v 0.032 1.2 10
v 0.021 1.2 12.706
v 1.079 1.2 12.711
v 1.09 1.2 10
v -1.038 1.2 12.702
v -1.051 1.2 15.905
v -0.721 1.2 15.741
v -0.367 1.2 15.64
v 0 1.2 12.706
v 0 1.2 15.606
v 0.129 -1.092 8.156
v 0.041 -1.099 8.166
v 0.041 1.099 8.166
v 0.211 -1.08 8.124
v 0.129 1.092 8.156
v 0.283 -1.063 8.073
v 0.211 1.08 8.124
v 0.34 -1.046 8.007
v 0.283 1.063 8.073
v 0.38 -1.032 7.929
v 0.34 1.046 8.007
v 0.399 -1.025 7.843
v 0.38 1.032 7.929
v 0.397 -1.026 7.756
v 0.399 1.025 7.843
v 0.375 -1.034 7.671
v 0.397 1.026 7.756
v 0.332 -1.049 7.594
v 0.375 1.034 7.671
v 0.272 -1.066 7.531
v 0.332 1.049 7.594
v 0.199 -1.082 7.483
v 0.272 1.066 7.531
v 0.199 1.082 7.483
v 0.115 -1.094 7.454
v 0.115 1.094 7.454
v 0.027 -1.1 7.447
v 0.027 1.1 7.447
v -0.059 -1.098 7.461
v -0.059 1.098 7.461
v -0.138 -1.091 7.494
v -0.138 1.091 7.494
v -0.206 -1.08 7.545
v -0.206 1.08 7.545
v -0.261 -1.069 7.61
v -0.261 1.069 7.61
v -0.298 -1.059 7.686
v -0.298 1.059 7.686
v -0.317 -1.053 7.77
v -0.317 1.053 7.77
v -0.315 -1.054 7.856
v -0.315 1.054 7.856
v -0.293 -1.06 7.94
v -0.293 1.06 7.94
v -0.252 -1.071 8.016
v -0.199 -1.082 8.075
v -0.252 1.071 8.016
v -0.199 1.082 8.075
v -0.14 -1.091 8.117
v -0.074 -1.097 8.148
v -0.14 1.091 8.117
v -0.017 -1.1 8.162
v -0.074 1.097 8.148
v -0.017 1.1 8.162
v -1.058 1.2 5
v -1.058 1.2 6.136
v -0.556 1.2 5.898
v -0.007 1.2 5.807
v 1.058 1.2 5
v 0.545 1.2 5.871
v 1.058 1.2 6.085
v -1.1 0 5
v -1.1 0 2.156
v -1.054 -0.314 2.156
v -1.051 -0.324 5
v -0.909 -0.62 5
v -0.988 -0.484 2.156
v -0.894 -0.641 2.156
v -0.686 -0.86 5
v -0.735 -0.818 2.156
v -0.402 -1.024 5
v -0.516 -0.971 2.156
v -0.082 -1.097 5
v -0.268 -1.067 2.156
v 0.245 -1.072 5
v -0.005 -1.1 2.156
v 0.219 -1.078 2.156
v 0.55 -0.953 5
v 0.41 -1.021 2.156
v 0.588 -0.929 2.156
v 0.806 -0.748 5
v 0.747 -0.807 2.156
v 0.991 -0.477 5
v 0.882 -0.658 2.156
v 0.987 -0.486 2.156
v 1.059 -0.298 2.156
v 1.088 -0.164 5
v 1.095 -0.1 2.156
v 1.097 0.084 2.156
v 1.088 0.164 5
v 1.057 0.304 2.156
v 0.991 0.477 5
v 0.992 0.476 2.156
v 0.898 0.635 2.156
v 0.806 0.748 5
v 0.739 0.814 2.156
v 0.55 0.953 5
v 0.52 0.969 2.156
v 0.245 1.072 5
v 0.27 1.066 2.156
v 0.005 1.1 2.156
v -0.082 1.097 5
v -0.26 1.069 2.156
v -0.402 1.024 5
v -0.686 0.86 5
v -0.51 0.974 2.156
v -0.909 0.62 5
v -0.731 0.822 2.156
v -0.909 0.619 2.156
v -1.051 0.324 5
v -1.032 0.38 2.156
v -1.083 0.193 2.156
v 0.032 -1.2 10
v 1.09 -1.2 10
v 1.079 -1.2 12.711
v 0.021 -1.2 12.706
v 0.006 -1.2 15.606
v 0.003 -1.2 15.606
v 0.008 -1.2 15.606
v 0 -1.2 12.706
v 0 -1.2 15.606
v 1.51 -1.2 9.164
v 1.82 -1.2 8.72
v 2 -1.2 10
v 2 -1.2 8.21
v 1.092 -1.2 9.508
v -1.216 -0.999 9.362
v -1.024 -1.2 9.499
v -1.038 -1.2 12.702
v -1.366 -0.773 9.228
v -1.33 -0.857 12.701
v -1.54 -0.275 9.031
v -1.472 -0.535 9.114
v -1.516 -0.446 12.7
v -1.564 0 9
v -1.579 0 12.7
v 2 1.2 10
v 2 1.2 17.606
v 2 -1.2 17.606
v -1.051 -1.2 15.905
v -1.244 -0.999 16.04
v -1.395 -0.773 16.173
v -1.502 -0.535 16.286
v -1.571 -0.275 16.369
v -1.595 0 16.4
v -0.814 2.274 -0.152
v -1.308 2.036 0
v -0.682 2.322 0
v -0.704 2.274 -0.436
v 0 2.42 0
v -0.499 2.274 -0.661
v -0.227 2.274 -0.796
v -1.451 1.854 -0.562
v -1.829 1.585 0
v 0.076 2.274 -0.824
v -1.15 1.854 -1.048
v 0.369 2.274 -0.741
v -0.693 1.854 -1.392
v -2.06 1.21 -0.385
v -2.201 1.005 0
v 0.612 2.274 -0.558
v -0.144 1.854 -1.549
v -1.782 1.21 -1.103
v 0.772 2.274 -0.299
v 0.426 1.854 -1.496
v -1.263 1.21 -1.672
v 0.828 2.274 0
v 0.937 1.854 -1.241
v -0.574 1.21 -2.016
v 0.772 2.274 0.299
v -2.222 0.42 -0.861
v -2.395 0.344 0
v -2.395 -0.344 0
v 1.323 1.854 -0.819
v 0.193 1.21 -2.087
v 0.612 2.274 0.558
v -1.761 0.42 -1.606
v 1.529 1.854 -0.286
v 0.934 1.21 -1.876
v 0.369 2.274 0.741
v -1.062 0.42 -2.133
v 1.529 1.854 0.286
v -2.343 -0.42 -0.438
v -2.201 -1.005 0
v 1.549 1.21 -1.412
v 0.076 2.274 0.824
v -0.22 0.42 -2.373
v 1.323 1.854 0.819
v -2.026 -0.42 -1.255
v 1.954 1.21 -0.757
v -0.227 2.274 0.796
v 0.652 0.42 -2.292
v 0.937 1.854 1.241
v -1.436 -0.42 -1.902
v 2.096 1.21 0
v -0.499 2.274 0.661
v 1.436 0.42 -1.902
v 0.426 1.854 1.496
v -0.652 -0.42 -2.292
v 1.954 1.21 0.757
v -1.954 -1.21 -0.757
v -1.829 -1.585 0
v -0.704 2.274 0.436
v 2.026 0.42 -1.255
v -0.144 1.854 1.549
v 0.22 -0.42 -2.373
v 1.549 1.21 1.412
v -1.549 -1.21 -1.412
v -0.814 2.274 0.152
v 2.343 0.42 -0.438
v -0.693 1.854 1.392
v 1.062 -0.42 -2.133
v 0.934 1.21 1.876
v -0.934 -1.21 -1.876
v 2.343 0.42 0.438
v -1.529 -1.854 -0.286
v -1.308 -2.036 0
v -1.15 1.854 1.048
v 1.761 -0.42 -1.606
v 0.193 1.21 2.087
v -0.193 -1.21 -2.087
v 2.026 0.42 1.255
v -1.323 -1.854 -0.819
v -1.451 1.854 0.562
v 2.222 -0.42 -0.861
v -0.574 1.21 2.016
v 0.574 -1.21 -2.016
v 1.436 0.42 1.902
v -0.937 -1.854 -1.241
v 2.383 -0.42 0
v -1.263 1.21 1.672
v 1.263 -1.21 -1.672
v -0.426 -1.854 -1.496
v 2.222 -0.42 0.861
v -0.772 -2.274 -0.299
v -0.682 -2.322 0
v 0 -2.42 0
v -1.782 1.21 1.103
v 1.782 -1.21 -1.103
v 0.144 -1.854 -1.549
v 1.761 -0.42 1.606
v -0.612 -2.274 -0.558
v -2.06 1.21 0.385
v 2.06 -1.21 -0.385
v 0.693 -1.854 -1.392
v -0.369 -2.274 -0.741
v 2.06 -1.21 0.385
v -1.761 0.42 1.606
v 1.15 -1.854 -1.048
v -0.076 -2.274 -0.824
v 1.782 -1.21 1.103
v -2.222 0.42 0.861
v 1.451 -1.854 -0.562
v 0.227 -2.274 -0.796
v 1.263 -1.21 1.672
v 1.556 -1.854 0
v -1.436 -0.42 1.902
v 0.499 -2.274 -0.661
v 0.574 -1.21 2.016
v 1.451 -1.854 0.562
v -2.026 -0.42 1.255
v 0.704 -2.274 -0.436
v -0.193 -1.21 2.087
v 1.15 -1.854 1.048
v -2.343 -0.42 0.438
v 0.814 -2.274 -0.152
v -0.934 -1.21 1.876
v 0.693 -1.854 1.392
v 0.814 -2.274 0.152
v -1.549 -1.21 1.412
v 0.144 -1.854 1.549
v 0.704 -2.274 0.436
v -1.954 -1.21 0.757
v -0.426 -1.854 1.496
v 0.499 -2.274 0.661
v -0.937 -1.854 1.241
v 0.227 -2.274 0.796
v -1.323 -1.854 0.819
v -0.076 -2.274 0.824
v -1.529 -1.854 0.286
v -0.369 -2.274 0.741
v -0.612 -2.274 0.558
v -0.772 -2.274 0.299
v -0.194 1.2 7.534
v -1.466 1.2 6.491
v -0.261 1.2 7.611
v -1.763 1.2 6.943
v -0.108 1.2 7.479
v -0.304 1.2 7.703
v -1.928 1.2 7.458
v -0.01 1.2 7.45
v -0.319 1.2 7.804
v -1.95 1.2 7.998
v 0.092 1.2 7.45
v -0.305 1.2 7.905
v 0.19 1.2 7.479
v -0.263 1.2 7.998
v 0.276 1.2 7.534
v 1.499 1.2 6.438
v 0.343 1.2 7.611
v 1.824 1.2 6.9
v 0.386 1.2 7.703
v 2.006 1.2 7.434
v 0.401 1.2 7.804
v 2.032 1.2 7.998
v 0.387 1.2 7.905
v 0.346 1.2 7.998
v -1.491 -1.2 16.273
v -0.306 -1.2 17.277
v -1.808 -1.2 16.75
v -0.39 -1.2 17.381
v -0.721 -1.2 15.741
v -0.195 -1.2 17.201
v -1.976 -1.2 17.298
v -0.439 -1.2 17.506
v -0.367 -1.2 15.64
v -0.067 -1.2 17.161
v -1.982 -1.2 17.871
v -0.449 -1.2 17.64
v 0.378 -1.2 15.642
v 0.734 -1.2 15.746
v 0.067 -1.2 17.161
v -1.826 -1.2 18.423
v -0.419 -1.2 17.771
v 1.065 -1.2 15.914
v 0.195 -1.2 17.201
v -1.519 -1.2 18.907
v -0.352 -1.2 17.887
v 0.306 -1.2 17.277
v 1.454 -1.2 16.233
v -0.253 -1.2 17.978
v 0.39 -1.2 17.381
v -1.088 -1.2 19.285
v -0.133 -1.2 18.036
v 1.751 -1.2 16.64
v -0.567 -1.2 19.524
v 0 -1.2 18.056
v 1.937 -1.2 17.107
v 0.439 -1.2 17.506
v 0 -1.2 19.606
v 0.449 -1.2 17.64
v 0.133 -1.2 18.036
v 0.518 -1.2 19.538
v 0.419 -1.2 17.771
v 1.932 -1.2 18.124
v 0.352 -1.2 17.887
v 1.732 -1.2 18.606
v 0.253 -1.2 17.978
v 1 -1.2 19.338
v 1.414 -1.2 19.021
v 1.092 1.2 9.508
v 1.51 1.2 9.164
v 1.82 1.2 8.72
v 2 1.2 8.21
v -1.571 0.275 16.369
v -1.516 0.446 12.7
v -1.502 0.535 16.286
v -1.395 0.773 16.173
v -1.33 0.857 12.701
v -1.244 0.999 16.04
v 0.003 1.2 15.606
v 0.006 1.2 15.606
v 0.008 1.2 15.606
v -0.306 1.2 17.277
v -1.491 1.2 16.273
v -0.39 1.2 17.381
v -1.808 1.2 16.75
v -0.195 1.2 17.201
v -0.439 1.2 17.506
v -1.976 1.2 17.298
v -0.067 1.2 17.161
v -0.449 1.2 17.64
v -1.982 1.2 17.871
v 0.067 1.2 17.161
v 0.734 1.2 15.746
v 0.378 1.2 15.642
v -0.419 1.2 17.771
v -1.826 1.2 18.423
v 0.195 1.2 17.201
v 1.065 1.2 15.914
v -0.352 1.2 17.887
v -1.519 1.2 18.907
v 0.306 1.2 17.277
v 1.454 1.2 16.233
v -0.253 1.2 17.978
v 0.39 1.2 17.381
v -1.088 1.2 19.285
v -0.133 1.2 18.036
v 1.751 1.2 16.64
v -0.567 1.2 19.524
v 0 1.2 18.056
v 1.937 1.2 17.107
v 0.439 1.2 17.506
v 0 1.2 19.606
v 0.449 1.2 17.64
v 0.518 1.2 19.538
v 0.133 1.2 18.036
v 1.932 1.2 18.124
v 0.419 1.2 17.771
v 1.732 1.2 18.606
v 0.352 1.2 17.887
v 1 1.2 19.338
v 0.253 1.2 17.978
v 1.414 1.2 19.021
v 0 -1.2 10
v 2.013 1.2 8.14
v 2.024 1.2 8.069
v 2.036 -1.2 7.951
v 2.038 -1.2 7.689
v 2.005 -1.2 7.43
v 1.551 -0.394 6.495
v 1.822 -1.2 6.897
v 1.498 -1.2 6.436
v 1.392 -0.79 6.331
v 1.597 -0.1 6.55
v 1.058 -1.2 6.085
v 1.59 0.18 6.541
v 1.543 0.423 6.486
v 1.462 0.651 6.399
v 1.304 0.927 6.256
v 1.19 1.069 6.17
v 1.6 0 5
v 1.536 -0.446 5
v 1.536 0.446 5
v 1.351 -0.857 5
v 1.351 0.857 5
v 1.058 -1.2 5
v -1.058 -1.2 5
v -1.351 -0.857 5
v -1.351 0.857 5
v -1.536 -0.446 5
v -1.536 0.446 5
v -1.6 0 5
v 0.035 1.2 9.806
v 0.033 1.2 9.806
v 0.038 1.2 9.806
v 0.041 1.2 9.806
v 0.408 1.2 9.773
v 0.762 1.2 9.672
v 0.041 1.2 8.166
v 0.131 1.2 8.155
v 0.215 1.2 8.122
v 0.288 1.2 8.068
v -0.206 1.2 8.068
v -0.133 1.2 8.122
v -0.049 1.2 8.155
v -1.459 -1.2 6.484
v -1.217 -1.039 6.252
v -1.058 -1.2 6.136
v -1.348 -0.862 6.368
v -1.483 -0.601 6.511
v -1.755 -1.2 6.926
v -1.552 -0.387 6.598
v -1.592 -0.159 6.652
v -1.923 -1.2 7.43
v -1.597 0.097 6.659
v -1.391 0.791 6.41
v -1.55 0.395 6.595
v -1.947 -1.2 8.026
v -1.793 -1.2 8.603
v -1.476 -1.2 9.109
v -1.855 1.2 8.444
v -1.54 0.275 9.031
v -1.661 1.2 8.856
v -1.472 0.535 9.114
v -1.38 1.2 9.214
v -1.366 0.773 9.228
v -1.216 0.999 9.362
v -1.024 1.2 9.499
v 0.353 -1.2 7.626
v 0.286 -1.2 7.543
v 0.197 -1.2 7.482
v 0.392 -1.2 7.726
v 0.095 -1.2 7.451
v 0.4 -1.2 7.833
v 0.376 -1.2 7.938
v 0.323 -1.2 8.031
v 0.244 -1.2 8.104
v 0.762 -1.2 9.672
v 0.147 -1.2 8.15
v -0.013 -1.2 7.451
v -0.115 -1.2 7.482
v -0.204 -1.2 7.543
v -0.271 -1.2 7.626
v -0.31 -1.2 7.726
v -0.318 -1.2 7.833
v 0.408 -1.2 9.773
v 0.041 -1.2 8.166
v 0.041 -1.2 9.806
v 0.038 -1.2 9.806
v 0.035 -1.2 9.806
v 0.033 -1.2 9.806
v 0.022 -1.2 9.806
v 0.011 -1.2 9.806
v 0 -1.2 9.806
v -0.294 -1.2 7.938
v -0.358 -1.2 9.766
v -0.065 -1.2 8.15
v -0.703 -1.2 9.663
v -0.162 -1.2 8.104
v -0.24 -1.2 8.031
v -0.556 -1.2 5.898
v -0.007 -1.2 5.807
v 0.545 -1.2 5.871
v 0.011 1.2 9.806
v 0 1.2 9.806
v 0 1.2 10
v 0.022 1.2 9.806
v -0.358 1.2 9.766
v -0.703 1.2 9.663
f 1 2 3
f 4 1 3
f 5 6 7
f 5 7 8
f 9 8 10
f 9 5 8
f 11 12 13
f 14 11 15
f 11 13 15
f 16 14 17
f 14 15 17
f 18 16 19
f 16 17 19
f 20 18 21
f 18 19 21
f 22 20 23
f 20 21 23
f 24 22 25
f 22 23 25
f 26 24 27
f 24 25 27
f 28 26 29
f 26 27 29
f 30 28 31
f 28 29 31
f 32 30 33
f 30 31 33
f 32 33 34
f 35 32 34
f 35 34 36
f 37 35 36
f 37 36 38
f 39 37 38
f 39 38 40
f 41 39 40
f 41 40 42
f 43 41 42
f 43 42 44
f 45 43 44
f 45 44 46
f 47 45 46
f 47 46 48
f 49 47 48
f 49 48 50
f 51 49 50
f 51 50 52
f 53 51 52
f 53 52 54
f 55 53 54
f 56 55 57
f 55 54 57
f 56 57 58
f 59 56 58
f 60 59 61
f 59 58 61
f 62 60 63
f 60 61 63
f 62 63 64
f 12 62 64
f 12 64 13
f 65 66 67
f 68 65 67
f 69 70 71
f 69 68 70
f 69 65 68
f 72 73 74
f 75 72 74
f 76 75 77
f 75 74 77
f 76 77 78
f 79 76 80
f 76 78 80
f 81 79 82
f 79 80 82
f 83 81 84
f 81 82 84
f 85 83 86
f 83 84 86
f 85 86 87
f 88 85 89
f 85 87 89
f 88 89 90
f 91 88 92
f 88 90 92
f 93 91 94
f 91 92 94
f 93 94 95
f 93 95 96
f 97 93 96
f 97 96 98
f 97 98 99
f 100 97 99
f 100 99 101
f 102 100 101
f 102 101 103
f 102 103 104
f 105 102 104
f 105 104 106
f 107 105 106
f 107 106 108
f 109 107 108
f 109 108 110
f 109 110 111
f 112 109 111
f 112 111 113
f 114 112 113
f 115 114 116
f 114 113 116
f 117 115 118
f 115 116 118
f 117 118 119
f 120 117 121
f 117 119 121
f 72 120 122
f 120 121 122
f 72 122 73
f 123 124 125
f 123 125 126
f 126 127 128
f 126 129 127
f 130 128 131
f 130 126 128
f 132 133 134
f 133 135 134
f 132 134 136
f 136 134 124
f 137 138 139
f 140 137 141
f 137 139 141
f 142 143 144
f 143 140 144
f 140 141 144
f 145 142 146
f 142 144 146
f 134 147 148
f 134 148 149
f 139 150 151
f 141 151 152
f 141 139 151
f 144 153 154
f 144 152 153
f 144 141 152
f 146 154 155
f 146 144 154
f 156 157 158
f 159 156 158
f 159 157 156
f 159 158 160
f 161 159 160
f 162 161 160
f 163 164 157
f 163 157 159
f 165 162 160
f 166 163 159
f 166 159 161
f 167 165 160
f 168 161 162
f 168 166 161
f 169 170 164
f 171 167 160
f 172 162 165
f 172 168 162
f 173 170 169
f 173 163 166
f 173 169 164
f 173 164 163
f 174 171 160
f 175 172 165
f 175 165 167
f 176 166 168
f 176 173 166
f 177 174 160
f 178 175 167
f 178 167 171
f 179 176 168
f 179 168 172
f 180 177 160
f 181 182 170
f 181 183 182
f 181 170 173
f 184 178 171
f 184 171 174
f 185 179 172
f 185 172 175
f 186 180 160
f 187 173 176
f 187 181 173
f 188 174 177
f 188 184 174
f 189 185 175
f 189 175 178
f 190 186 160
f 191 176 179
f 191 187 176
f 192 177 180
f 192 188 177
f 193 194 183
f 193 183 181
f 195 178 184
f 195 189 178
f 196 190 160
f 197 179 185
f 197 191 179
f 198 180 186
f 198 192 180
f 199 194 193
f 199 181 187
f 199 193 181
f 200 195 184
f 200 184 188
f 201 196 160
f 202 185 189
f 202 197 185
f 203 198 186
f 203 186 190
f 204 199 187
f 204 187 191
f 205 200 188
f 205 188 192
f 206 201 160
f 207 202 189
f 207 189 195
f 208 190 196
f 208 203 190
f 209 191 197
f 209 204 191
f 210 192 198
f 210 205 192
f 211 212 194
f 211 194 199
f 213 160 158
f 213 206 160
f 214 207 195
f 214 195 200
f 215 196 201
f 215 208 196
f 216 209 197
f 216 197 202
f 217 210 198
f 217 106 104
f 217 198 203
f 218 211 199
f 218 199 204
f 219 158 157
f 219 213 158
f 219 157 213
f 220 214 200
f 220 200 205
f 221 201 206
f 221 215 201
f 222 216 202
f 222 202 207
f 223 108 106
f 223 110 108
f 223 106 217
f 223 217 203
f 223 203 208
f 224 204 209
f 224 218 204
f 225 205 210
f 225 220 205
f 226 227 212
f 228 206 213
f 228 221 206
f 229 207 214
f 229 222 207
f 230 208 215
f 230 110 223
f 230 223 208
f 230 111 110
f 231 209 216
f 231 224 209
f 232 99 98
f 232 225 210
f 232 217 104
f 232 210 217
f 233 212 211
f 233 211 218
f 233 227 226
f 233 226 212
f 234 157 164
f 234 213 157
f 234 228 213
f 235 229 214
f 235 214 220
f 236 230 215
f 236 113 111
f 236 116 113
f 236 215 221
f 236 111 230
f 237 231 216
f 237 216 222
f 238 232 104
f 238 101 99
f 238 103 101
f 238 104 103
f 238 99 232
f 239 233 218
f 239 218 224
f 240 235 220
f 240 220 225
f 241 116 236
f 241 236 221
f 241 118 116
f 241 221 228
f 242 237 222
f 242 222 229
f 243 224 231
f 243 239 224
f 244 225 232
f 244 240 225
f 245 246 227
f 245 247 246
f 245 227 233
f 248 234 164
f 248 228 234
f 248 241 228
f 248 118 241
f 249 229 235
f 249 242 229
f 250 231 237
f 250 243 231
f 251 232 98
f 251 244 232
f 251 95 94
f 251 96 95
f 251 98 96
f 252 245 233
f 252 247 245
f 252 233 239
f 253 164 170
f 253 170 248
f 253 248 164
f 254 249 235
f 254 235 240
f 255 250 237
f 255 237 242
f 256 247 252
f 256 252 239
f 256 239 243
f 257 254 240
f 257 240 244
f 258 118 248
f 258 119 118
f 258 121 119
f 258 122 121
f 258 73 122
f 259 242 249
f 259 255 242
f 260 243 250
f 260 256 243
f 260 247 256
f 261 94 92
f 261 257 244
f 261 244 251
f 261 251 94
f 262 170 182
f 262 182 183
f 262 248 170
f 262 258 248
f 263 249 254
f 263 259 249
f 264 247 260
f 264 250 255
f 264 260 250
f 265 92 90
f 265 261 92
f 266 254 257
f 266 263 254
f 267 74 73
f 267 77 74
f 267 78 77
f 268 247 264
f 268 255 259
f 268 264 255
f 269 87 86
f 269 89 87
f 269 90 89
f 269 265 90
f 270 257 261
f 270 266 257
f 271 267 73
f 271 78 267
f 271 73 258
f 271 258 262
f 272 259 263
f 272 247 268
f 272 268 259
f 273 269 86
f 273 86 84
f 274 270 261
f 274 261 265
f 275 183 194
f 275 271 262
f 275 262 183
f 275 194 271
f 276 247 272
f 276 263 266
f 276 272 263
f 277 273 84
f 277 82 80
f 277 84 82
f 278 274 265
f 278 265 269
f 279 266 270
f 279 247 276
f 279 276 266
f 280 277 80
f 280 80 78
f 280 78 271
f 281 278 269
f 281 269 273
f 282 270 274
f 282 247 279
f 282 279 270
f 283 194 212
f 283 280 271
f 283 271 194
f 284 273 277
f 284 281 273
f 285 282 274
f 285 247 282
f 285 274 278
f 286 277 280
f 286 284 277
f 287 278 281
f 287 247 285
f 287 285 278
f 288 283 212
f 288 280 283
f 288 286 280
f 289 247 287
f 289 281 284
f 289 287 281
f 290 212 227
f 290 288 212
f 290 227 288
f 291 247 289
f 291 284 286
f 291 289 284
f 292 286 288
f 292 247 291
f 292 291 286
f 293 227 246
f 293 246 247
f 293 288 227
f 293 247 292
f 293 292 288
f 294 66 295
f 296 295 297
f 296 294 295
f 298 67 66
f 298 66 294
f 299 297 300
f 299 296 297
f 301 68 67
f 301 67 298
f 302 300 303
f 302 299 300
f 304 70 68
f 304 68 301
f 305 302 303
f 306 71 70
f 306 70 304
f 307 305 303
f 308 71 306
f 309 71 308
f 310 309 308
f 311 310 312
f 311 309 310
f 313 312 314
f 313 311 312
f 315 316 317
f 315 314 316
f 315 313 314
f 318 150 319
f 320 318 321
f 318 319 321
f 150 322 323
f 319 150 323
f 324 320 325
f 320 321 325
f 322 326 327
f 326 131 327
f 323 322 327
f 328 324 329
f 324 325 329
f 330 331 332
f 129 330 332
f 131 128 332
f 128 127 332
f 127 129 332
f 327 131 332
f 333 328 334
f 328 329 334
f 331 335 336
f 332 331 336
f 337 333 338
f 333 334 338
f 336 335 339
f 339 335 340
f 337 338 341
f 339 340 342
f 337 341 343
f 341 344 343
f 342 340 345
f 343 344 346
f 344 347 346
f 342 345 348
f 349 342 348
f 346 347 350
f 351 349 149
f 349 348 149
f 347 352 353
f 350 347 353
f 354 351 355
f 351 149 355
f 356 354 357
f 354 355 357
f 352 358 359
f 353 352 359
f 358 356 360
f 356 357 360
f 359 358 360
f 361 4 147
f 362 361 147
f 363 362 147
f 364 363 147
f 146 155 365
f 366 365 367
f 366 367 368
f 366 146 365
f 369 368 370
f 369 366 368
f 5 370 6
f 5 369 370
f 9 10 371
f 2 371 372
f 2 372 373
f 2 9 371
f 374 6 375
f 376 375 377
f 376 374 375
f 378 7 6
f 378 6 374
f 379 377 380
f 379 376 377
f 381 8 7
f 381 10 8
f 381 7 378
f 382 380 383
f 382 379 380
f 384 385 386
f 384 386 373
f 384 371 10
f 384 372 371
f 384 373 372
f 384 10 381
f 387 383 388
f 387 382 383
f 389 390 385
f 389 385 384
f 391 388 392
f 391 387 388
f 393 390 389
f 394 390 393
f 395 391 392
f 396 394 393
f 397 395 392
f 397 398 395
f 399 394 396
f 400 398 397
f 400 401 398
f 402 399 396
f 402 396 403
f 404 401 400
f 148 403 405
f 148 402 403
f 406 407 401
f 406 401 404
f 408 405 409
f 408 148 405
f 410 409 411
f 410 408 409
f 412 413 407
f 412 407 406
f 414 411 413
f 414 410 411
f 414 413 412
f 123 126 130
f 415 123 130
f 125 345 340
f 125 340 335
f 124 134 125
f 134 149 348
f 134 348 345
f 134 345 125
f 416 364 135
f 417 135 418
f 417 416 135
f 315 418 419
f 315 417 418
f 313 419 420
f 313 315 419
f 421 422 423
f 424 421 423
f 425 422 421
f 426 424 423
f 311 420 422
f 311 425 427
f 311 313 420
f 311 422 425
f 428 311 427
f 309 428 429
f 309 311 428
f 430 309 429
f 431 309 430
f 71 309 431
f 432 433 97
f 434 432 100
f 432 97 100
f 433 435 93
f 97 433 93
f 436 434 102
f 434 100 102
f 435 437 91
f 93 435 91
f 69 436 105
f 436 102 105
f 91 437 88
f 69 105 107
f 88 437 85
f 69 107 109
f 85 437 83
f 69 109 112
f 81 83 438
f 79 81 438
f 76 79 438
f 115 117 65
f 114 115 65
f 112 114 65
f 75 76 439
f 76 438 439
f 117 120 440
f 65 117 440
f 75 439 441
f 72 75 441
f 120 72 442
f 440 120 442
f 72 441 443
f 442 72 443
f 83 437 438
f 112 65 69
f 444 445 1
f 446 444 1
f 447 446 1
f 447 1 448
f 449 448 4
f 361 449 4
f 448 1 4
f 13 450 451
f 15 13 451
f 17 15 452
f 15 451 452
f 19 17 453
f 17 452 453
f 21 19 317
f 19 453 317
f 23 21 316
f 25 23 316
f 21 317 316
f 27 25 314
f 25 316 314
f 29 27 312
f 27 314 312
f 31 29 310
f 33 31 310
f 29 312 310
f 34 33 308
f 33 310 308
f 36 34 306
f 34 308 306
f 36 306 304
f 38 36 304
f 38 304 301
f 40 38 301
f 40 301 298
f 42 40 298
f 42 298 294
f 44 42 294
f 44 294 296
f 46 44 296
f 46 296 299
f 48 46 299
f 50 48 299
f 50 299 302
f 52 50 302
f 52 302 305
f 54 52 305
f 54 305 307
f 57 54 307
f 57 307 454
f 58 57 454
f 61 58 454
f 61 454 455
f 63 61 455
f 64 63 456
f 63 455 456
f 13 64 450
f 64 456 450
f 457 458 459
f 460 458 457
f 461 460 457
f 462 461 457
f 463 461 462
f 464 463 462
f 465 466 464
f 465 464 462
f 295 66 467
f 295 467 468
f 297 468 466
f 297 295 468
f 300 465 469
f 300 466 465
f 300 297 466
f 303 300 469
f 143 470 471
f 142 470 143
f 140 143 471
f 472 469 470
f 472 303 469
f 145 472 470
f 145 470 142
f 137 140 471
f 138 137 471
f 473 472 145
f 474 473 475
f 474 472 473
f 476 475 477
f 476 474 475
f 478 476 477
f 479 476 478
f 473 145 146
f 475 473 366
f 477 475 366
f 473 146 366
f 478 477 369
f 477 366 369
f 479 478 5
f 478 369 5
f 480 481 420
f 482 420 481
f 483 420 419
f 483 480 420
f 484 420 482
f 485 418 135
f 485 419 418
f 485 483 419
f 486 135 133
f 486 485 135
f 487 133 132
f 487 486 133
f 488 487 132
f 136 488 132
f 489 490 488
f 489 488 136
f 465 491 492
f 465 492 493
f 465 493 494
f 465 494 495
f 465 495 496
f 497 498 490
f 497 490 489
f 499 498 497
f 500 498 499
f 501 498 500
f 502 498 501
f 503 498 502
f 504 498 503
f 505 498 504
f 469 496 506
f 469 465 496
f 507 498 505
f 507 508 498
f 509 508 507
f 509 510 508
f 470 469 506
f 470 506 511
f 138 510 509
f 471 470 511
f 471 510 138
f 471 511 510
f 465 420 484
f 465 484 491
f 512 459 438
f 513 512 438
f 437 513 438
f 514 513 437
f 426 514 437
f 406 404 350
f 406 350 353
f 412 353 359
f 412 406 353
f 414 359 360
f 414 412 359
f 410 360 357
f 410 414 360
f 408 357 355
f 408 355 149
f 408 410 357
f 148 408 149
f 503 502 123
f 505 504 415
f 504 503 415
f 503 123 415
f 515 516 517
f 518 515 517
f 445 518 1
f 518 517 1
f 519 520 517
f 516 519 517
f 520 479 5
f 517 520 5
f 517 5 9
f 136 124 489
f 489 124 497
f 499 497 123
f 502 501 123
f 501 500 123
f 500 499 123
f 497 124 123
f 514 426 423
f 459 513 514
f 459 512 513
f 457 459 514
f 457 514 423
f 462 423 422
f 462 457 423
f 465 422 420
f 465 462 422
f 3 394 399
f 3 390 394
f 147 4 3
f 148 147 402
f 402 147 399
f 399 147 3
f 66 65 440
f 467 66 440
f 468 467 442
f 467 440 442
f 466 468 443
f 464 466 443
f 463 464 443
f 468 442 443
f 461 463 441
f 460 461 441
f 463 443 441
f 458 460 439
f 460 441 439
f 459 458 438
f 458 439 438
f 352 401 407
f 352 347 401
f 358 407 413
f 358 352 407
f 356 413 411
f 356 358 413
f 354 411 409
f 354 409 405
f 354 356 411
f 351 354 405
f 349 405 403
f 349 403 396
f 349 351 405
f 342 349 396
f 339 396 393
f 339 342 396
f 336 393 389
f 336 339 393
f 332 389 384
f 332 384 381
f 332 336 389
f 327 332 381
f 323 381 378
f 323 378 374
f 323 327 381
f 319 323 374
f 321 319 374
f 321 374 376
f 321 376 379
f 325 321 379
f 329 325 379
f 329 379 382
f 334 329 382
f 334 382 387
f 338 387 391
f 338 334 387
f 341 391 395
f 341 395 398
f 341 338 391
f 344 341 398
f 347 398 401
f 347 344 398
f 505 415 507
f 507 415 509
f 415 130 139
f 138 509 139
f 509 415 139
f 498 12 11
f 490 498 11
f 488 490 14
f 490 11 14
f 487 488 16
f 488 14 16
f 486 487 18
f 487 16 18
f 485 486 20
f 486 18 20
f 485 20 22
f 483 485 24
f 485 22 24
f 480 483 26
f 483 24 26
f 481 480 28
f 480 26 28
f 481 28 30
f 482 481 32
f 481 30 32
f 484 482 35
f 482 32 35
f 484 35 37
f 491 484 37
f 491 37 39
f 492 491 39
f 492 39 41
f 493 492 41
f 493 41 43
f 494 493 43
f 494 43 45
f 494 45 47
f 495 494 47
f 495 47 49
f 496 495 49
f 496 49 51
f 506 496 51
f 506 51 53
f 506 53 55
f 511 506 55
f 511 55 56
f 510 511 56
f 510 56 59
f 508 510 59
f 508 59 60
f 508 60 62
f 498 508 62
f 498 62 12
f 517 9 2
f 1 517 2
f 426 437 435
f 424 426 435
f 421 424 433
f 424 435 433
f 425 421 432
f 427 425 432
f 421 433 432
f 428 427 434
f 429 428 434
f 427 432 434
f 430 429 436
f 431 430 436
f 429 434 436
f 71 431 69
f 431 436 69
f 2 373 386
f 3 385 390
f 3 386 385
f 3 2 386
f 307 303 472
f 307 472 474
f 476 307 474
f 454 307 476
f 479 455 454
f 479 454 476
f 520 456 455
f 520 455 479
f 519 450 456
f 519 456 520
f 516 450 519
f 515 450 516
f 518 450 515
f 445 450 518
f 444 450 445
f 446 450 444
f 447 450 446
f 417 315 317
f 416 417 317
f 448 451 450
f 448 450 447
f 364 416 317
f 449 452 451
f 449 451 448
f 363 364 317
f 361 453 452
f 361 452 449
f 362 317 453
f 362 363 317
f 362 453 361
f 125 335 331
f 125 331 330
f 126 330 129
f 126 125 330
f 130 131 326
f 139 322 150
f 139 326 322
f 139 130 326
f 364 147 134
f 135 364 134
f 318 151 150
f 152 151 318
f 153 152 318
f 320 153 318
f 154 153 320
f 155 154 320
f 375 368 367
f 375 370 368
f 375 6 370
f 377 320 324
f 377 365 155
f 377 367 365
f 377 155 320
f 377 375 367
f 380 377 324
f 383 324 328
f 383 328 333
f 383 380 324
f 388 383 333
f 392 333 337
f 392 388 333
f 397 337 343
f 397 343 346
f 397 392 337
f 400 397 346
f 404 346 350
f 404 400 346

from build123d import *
from build123d.topology import SkipClean

# Parameters (mm, degrees)
SKETCH_2_R                        = 1.1
EXTRUDE_1_DEPTH                   = 17.6064
CUT_EXTRUDE_1_DEPTH               = 18.93594504
CUT_EXTRUDE_1_DEPTH_BACK          = 18.93594504
SKETCH_3_R                        = 2
SKETCH_3_3_R                      = 2
SKETCH_3_3_R_2                    = 0.45
EXTRUDE_2_DEPTH                   = 1.2
EXTRUDE_8_REACH                   = 22.084
SKETCH_7_R                        = 2
SKETCH_7_R_2                      = 0.36
EXTRUDE_9_REACH                   = 17.744
EXTRUDE_9_END_RADIUS              = 2
EXTRUDE_9_DIRECTION_2_REACH       = 17.744
EXTRUDE_9_DIRECTION_2_END_RADIUS  = 2
SKETCH_11_R                       = 0.36
CUT_EXTRUDE_2_DEPTH               = 21.084116234
EXTRUDE_10_REACH                  = 14.883
EXTRUDE_10_END_RADIUS             = 2
EXTRUDE_10_DIRECTION_2_REACH      = 14.883
EXTRUDE_10_DIRECTION_2_END_RADIUS = 2
EXTRUDE_11_REACH                  = 17.002
EXTRUDE_11_END_RADIUS             = 2
SKETCH_13_R                       = 1.6
SKETCH_14_W                       = 7.40434877
SKETCH_14_H                       = 4.06336213
CUT_EXTRUDE_3_DEPTH               = 21.084116234
SKETCH_15_W                       = 5.898333764
SKETCH_15_H                       = 3.047472445
CUT_EXTRUDE_4_DEPTH               = 21.084116234


with BuildPart() as part:
    # 草图1 → 旋转1 (revolve)
    with SkipClean():  # the faces are left unmerged after this step: merging them gives an invalid solid
        with BuildSketch(Plane.XY):
            with BuildLine():
                ThreePointArc((2.42, 0), (1.71119841, 1.71119841), (0, 2.42))
                Line((0, 2.42), (0, -2.42))
                ThreePointArc((0, -2.42), (1.71119841, -1.71119841), (2.42, 0))
            make_face()
            with BuildLine():
                Line((0, -2.42), (0, 2.42))
                ThreePointArc((0, 2.42), (-2.42, 0), (0, -2.42))
            make_face()
        revolve(axis=Axis((0, 2.42, 0), (0, -1, 0)))

    # 草图2 → 凸台-拉伸1 (add)
    with SkipClean():  # the faces are left unmerged after this step: merging them gives an invalid solid
        with BuildSketch(Plane.XY):
            with Locations(Location((0, 0, 0), (0, 0, 180))):
                Circle(SKETCH_2_R)
        extrude(amount=EXTRUDE_1_DEPTH)

    # 草图3 → 切除-拉伸1 (cut, two sides: drawn at the far end of the back side and taken through both)
    with SkipClean():  # the faces are left unmerged after this step: merging them gives an invalid solid
        with BuildSketch(Plane(origin=(0, 0, 0), x_dir=(1, 0, 0), z_dir=(0, 1, 0)).offset(-CUT_EXTRUDE_1_DEPTH_BACK)):
            with Locations((0, -17.6064)):
                Circle(SKETCH_3_R)
        extrude(amount=CUT_EXTRUDE_1_DEPTH + CUT_EXTRUDE_1_DEPTH_BACK, mode=Mode.SUBTRACT)

    # 草图3<3> → 凸台-拉伸2 (add, symmetric)
    with SkipClean():  # the faces are left unmerged after this step: merging them gives an invalid solid
        with BuildSketch(Plane(origin=(0, 0, 0), x_dir=(1, 0, 0), z_dir=(0, 1, 0))):
            with Locations(Location((0, -17.6064, 0), (0, 0, 270))):
                Circle(SKETCH_3_3_R)
            with Locations(Location((0, -17.6064, 0), (0, 0, 270))):
                Circle(SKETCH_3_3_R_2, mode=Mode.SUBTRACT)
        extrude(amount=EXTRUDE_2_DEPTH, both=True)

    # 凸台-拉伸8: up to this face of the body (flat: up to its plane)
    extrude_8_end = Plane(part.part.faces().sort_by_distance((0, -1.2, 15.662968542))[0])
    # 草图7 → 凸台-拉伸8 (add, up to the picked face)
    with BuildSketch(Plane(origin=(0, 1.2, 0), x_dir=(1, 0, 0), z_dir=(0, 1, 0)), mode=Mode.PRIVATE) as extrude_8_sk1:
        with Locations(Location((0.041050024, -7.806485975, 0), (0, 0, 270))):
            Circle(SKETCH_7_R)
        with Locations(Location((0.041050024, -7.806485975, 0), (0, 0, 270))):
            Circle(SKETCH_7_R_2, mode=Mode.SUBTRACT)
    extrude_8_tool1 = split(extrude(extrude_8_sk1.sketch, amount=-EXTRUDE_8_REACH, mode=Mode.PRIVATE), bisect_by=extrude_8_end, keep=Keep.BOTH, mode=Mode.PRIVATE)
    add(extrude_8_tool1.solids().sort_by(Axis((0.04105, 1.2, 5.863055), (0, -1, 0)))[0])

    # 凸台-拉伸9: up to this cylinder (the profile starts outside it)
    with SkipClean():  # the faces are left unmerged after this step: merging them gives an invalid solid
        extrude_9_end = Plane(origin=(0.041050024, 0, 7.806485975), z_dir=(0, 1, 0)) * Cylinder(EXTRUDE_9_END_RADIUS, 40.488, mode=Mode.PRIVATE)
        # 草图10 → 凸台-拉伸9 (add, up to the surface)
        with BuildSketch(Plane(origin=(0.020525012, 1.2, 12.706442988), x_dir=(-0.9999912270311377, 0, -0.0041887779554037885), z_dir=(0.0041887779554037885, 0, -0.9999912270311377)), mode=Mode.PRIVATE) as extrude_9_sk1:
            with BuildLine():
                Line((1.058300524, 0), (0, 0))
                Line((0, 0), (0, -2.4))
                Line((0, -2.4), (1.058300524, -2.4))
                ThreePointArc((1.058300524, -2.4), (1.458300524, -1.858300524), (1.6, -1.2))
                ThreePointArc((1.6, -1.2), (1.458300524, -0.541699476), (1.058300524, 0))
            make_face()
        extrude_9_tool1 = extrude(extrude_9_sk1.sketch, amount=EXTRUDE_9_REACH, mode=Mode.PRIVATE) - extrude_9_end
        add(extrude_9_tool1.solids().sort_by_distance((-0.704839, 0, 12.703405))[0])
        # 草图10 → 凸台-拉伸9 (add, up to the surface)
        with BuildSketch(Plane(origin=(0.020525012, 1.2, 12.706442988), x_dir=(-0.9999912270311377, 0, -0.0041887779554037885), z_dir=(0.0041887779554037885, 0, -0.9999912270311377)), mode=Mode.PRIVATE) as extrude_9_sk2:
            with BuildLine():
                Line((0, -2.4), (0, 0))
                Line((0, 0), (-1.058300524, 0))
                ThreePointArc((-1.058300524, 0), (-1.6, -1.2), (-1.058300524, -2.4))
                Line((-1.058300524, -2.4), (0, -2.4))
            make_face()
        extrude_9_tool2 = extrude(extrude_9_sk2.sketch, amount=EXTRUDE_9_REACH, mode=Mode.PRIVATE) - extrude_9_end
        add(extrude_9_tool2.solids().sort_by_distance((0.745889, 0, 12.709481))[0])
        # 草图10 → 凸台-拉伸9 (add, up to the surface)
        with BuildSketch(Plane(origin=(0.020525012, 1.2, 12.706442988), x_dir=(-0.9999912270311377, 0, -0.0041887779554037885), z_dir=(0.0041887779554037885, 0, -0.9999912270311377)), mode=Mode.PRIVATE) as extrude_9_sk3:
            with BuildLine():
                Line((1.058300524, 0), (0, 0))
                Line((0, 0), (0, -2.4))
                Line((0, -2.4), (1.058300524, -2.4))
                ThreePointArc((1.058300524, -2.4), (1.458300524, -1.858300524), (1.6, -1.2))
                ThreePointArc((1.6, -1.2), (1.458300524, -0.541699476), (1.058300524, 0))
            make_face()
        extrude_9_tool3 = extrude(extrude_9_sk3.sketch, amount=EXTRUDE_9_REACH, mode=Mode.PRIVATE) - extrude_9_end
        add(extrude_9_tool3.solids().sort_by_distance((-0.704839, 0, 12.703405))[0])
        # 草图10 → 凸台-拉伸9 (add, up to the surface)
        with BuildSketch(Plane(origin=(0.020525012, 1.2, 12.706442988), x_dir=(-0.9999912270311377, 0, -0.0041887779554037885), z_dir=(0.0041887779554037885, 0, -0.9999912270311377)), mode=Mode.PRIVATE) as extrude_9_sk4:
            with BuildLine():
                Line((0, -2.4), (0, 0))
                Line((0, 0), (-1.058300524, 0))
                ThreePointArc((-1.058300524, 0), (-1.6, -1.2), (-1.058300524, -2.4))
                Line((-1.058300524, -2.4), (0, -2.4))
            make_face()
        extrude_9_tool4 = extrude(extrude_9_sk4.sketch, amount=EXTRUDE_9_REACH, mode=Mode.PRIVATE) - extrude_9_end
        add(extrude_9_tool4.solids().sort_by_distance((0.745889, 0, 12.709481))[0])

    # 凸台-拉伸9 direction 2: up to this cylinder (the profile starts outside it)
    with SkipClean():  # the faces are left unmerged after this step: merging them gives an invalid solid
        extrude_9_direction_2_end = Plane(origin=(0, 0, 17.6064), z_dir=(0, -1, 0)) * Cylinder(EXTRUDE_9_DIRECTION_2_END_RADIUS, 40.488, mode=Mode.PRIVATE)
        # 草图10 → 凸台-拉伸9 direction 2 (add, up to the surface)
        with BuildSketch(Plane(origin=(0.020525012, 1.2, 12.706442988), x_dir=(-0.9999912270311377, 0, -0.0041887779554037885), z_dir=(0.0041887779554037885, 0, -0.9999912270311377)), mode=Mode.PRIVATE) as extrude_9_direction_2_sk1:
            with BuildLine():
                Line((1.058300524, 0), (0, 0))
                Line((0, 0), (0, -2.4))
                Line((0, -2.4), (1.058300524, -2.4))
                ThreePointArc((1.058300524, -2.4), (1.458300524, -1.858300524), (1.6, -1.2))
                ThreePointArc((1.6, -1.2), (1.458300524, -0.541699476), (1.058300524, 0))
            make_face()
        extrude_9_direction_2_tool1 = extrude(extrude_9_direction_2_sk1.sketch, amount=-EXTRUDE_9_DIRECTION_2_REACH, mode=Mode.PRIVATE) - extrude_9_direction_2_end
        add(extrude_9_direction_2_tool1.solids().sort_by_distance((-0.704839, 0, 12.703405))[0])
        # 草图10 → 凸台-拉伸9 direction 2 (add, up to the surface)
        with BuildSketch(Plane(origin=(0.020525012, 1.2, 12.706442988), x_dir=(-0.9999912270311377, 0, -0.0041887779554037885), z_dir=(0.0041887779554037885, 0, -0.9999912270311377)), mode=Mode.PRIVATE) as extrude_9_direction_2_sk2:
            with BuildLine():
                Line((0, -2.4), (0, 0))
                Line((0, 0), (-1.058300524, 0))
                ThreePointArc((-1.058300524, 0), (-1.6, -1.2), (-1.058300524, -2.4))
                Line((-1.058300524, -2.4), (0, -2.4))
            make_face()
        extrude_9_direction_2_tool2 = extrude(extrude_9_direction_2_sk2.sketch, amount=-EXTRUDE_9_DIRECTION_2_REACH, mode=Mode.PRIVATE) - extrude_9_direction_2_end
        add(extrude_9_direction_2_tool2.solids().sort_by_distance((0.745889, 0, 12.709481))[0])
        # 草图10 → 凸台-拉伸9 direction 2 (add, up to the surface)
        with BuildSketch(Plane(origin=(0.020525012, 1.2, 12.706442988), x_dir=(-0.9999912270311377, 0, -0.0041887779554037885), z_dir=(0.0041887779554037885, 0, -0.9999912270311377)), mode=Mode.PRIVATE) as extrude_9_direction_2_sk3:
            with BuildLine():
                Line((1.058300524, 0), (0, 0))
                Line((0, 0), (0, -2.4))
                Line((0, -2.4), (1.058300524, -2.4))
                ThreePointArc((1.058300524, -2.4), (1.458300524, -1.858300524), (1.6, -1.2))
                ThreePointArc((1.6, -1.2), (1.458300524, -0.541699476), (1.058300524, 0))
            make_face()
        extrude_9_direction_2_tool3 = extrude(extrude_9_direction_2_sk3.sketch, amount=-EXTRUDE_9_DIRECTION_2_REACH, mode=Mode.PRIVATE) - extrude_9_direction_2_end
        add(extrude_9_direction_2_tool3.solids().sort_by_distance((-0.704839, 0, 12.703405))[0])
        # 草图10 → 凸台-拉伸9 direction 2 (add, up to the surface)
        with BuildSketch(Plane(origin=(0.020525012, 1.2, 12.706442988), x_dir=(-0.9999912270311377, 0, -0.0041887779554037885), z_dir=(0.0041887779554037885, 0, -0.9999912270311377)), mode=Mode.PRIVATE) as extrude_9_direction_2_sk4:
            with BuildLine():
                Line((0, -2.4), (0, 0))
                Line((0, 0), (-1.058300524, 0))
                ThreePointArc((-1.058300524, 0), (-1.6, -1.2), (-1.058300524, -2.4))
                Line((-1.058300524, -2.4), (0, -2.4))
            make_face()
        extrude_9_direction_2_tool4 = extrude(extrude_9_direction_2_sk4.sketch, amount=-EXTRUDE_9_DIRECTION_2_REACH, mode=Mode.PRIVATE) - extrude_9_direction_2_end
        add(extrude_9_direction_2_tool4.solids().sort_by_distance((0.745889, 0, 12.709481))[0])

    # 草图11 → 切除-拉伸2 (cut, through all)
    with SkipClean():  # the faces are left unmerged after this step: merging them gives an invalid solid
        with BuildSketch(Plane(origin=(0, 1.2, 0), x_dir=(1, 0, 0), z_dir=(0, 1, 0))):
            with Locations(Location((0.041050024, -7.806485975, 0), (0, 0, 270))):
                Circle(SKETCH_11_R)
        extrude(amount=-CUT_EXTRUDE_2_DEPTH, mode=Mode.SUBTRACT)

    # 凸台-拉伸10: up to this cylinder (the profile starts outside it)
    with SkipClean():  # the faces are left unmerged after this step: merging them gives an invalid solid
        extrude_10_end = Plane(origin=(0.041050024, 0, 7.806485975), z_dir=(0, 1, 0)) * Cylinder(EXTRUDE_10_END_RADIUS, 34.766, mode=Mode.PRIVATE)
        # 草图12 → 凸台-拉伸10 (add, up to the surface)
        with BuildSketch(Plane.XY.offset(10), mode=Mode.PRIVATE) as extrude_10_sk1:
            Polygon((0, 0), (0, 1.2), (2, 1.2), (2, -1.2), (0, -1.2), align=None)
        extrude_10_tool1 = extrude(extrude_10_sk1.sketch, amount=-EXTRUDE_10_REACH, mode=Mode.PRIVATE) - extrude_10_end
        add(extrude_10_tool1.solids().sort_by_distance((1, 0, 10))[0])

    # 凸台-拉伸10 direction 2: up to this cylinder (the profile starts outside it)
    with SkipClean():  # the faces are left unmerged after this step: merging them gives an invalid solid
        extrude_10_direction_2_end = Plane(origin=(0, 0, 17.6064), z_dir=(0, -1, 0)) * Cylinder(EXTRUDE_10_DIRECTION_2_END_RADIUS, 34.766, mode=Mode.PRIVATE)
        # 草图12 → 凸台-拉伸10 direction 2 (add, up to the surface)
        with BuildSketch(Plane.XY.offset(10), mode=Mode.PRIVATE) as extrude_10_direction_2_sk1:
            Polygon((0, 0), (0, 1.2), (2, 1.2), (2, -1.2), (0, -1.2), align=None)
        extrude_10_direction_2_tool1 = extrude(extrude_10_direction_2_sk1.sketch, amount=EXTRUDE_10_DIRECTION_2_REACH, mode=Mode.PRIVATE) - extrude_10_direction_2_end
        add(extrude_10_direction_2_tool1.solids().sort_by_distance((1, 0, 10))[0])

    # 凸台-拉伸11: up to this cylinder (the profile starts outside it)
    with SkipClean():  # the faces are left unmerged after this step: merging them gives an invalid solid
        extrude_11_end = Plane(origin=(0.041050024, 0, 7.806485975), z_dir=(0, 1, 0)) * Cylinder(EXTRUDE_11_END_RADIUS, 39.004, mode=Mode.PRIVATE)
        # 草图13 → 凸台-拉伸11 (add, up to the surface)
        with BuildSketch(Plane.XY.offset(5), mode=Mode.PRIVATE) as extrude_11_sk1:
            with Locations(Location((0, 0, 0), (0, 0, 131.409594385))):
                Circle(SKETCH_13_R)
        extrude_11_tool1 = extrude(extrude_11_sk1.sketch, amount=EXTRUDE_11_REACH, mode=Mode.PRIVATE) - extrude_11_end
        add(extrude_11_tool1.solids().sort_by_distance((0, 0, 5))[0])

    # 草图14 → 切除-拉伸3 (cut, through all)
    with SkipClean():  # the faces are left unmerged after this step: merging them gives an invalid solid
        with BuildSketch(Plane(origin=(0, 1.2, 0), x_dir=(1, 0, 0), z_dir=(0, 1, 0))):
            with Locations((0.094582813, -5.966785927)):
                Rectangle(SKETCH_14_W, SKETCH_14_H)
        extrude(amount=CUT_EXTRUDE_3_DEPTH, mode=Mode.SUBTRACT)

    # 草图15 → 切除-拉伸4 (cut, through all)
    with SkipClean():  # the faces are left unmerged after this step: merging them gives an invalid solid
        with BuildSketch(Plane.XZ.offset(1.2)):
            with Locations((0.081921302, 5.906181286)):
                Rectangle(SKETCH_15_W, SKETCH_15_H)
        extrude(amount=CUT_EXTRUDE_4_DEPTH, mode=Mode.SUBTRACT)


solid = part.part
